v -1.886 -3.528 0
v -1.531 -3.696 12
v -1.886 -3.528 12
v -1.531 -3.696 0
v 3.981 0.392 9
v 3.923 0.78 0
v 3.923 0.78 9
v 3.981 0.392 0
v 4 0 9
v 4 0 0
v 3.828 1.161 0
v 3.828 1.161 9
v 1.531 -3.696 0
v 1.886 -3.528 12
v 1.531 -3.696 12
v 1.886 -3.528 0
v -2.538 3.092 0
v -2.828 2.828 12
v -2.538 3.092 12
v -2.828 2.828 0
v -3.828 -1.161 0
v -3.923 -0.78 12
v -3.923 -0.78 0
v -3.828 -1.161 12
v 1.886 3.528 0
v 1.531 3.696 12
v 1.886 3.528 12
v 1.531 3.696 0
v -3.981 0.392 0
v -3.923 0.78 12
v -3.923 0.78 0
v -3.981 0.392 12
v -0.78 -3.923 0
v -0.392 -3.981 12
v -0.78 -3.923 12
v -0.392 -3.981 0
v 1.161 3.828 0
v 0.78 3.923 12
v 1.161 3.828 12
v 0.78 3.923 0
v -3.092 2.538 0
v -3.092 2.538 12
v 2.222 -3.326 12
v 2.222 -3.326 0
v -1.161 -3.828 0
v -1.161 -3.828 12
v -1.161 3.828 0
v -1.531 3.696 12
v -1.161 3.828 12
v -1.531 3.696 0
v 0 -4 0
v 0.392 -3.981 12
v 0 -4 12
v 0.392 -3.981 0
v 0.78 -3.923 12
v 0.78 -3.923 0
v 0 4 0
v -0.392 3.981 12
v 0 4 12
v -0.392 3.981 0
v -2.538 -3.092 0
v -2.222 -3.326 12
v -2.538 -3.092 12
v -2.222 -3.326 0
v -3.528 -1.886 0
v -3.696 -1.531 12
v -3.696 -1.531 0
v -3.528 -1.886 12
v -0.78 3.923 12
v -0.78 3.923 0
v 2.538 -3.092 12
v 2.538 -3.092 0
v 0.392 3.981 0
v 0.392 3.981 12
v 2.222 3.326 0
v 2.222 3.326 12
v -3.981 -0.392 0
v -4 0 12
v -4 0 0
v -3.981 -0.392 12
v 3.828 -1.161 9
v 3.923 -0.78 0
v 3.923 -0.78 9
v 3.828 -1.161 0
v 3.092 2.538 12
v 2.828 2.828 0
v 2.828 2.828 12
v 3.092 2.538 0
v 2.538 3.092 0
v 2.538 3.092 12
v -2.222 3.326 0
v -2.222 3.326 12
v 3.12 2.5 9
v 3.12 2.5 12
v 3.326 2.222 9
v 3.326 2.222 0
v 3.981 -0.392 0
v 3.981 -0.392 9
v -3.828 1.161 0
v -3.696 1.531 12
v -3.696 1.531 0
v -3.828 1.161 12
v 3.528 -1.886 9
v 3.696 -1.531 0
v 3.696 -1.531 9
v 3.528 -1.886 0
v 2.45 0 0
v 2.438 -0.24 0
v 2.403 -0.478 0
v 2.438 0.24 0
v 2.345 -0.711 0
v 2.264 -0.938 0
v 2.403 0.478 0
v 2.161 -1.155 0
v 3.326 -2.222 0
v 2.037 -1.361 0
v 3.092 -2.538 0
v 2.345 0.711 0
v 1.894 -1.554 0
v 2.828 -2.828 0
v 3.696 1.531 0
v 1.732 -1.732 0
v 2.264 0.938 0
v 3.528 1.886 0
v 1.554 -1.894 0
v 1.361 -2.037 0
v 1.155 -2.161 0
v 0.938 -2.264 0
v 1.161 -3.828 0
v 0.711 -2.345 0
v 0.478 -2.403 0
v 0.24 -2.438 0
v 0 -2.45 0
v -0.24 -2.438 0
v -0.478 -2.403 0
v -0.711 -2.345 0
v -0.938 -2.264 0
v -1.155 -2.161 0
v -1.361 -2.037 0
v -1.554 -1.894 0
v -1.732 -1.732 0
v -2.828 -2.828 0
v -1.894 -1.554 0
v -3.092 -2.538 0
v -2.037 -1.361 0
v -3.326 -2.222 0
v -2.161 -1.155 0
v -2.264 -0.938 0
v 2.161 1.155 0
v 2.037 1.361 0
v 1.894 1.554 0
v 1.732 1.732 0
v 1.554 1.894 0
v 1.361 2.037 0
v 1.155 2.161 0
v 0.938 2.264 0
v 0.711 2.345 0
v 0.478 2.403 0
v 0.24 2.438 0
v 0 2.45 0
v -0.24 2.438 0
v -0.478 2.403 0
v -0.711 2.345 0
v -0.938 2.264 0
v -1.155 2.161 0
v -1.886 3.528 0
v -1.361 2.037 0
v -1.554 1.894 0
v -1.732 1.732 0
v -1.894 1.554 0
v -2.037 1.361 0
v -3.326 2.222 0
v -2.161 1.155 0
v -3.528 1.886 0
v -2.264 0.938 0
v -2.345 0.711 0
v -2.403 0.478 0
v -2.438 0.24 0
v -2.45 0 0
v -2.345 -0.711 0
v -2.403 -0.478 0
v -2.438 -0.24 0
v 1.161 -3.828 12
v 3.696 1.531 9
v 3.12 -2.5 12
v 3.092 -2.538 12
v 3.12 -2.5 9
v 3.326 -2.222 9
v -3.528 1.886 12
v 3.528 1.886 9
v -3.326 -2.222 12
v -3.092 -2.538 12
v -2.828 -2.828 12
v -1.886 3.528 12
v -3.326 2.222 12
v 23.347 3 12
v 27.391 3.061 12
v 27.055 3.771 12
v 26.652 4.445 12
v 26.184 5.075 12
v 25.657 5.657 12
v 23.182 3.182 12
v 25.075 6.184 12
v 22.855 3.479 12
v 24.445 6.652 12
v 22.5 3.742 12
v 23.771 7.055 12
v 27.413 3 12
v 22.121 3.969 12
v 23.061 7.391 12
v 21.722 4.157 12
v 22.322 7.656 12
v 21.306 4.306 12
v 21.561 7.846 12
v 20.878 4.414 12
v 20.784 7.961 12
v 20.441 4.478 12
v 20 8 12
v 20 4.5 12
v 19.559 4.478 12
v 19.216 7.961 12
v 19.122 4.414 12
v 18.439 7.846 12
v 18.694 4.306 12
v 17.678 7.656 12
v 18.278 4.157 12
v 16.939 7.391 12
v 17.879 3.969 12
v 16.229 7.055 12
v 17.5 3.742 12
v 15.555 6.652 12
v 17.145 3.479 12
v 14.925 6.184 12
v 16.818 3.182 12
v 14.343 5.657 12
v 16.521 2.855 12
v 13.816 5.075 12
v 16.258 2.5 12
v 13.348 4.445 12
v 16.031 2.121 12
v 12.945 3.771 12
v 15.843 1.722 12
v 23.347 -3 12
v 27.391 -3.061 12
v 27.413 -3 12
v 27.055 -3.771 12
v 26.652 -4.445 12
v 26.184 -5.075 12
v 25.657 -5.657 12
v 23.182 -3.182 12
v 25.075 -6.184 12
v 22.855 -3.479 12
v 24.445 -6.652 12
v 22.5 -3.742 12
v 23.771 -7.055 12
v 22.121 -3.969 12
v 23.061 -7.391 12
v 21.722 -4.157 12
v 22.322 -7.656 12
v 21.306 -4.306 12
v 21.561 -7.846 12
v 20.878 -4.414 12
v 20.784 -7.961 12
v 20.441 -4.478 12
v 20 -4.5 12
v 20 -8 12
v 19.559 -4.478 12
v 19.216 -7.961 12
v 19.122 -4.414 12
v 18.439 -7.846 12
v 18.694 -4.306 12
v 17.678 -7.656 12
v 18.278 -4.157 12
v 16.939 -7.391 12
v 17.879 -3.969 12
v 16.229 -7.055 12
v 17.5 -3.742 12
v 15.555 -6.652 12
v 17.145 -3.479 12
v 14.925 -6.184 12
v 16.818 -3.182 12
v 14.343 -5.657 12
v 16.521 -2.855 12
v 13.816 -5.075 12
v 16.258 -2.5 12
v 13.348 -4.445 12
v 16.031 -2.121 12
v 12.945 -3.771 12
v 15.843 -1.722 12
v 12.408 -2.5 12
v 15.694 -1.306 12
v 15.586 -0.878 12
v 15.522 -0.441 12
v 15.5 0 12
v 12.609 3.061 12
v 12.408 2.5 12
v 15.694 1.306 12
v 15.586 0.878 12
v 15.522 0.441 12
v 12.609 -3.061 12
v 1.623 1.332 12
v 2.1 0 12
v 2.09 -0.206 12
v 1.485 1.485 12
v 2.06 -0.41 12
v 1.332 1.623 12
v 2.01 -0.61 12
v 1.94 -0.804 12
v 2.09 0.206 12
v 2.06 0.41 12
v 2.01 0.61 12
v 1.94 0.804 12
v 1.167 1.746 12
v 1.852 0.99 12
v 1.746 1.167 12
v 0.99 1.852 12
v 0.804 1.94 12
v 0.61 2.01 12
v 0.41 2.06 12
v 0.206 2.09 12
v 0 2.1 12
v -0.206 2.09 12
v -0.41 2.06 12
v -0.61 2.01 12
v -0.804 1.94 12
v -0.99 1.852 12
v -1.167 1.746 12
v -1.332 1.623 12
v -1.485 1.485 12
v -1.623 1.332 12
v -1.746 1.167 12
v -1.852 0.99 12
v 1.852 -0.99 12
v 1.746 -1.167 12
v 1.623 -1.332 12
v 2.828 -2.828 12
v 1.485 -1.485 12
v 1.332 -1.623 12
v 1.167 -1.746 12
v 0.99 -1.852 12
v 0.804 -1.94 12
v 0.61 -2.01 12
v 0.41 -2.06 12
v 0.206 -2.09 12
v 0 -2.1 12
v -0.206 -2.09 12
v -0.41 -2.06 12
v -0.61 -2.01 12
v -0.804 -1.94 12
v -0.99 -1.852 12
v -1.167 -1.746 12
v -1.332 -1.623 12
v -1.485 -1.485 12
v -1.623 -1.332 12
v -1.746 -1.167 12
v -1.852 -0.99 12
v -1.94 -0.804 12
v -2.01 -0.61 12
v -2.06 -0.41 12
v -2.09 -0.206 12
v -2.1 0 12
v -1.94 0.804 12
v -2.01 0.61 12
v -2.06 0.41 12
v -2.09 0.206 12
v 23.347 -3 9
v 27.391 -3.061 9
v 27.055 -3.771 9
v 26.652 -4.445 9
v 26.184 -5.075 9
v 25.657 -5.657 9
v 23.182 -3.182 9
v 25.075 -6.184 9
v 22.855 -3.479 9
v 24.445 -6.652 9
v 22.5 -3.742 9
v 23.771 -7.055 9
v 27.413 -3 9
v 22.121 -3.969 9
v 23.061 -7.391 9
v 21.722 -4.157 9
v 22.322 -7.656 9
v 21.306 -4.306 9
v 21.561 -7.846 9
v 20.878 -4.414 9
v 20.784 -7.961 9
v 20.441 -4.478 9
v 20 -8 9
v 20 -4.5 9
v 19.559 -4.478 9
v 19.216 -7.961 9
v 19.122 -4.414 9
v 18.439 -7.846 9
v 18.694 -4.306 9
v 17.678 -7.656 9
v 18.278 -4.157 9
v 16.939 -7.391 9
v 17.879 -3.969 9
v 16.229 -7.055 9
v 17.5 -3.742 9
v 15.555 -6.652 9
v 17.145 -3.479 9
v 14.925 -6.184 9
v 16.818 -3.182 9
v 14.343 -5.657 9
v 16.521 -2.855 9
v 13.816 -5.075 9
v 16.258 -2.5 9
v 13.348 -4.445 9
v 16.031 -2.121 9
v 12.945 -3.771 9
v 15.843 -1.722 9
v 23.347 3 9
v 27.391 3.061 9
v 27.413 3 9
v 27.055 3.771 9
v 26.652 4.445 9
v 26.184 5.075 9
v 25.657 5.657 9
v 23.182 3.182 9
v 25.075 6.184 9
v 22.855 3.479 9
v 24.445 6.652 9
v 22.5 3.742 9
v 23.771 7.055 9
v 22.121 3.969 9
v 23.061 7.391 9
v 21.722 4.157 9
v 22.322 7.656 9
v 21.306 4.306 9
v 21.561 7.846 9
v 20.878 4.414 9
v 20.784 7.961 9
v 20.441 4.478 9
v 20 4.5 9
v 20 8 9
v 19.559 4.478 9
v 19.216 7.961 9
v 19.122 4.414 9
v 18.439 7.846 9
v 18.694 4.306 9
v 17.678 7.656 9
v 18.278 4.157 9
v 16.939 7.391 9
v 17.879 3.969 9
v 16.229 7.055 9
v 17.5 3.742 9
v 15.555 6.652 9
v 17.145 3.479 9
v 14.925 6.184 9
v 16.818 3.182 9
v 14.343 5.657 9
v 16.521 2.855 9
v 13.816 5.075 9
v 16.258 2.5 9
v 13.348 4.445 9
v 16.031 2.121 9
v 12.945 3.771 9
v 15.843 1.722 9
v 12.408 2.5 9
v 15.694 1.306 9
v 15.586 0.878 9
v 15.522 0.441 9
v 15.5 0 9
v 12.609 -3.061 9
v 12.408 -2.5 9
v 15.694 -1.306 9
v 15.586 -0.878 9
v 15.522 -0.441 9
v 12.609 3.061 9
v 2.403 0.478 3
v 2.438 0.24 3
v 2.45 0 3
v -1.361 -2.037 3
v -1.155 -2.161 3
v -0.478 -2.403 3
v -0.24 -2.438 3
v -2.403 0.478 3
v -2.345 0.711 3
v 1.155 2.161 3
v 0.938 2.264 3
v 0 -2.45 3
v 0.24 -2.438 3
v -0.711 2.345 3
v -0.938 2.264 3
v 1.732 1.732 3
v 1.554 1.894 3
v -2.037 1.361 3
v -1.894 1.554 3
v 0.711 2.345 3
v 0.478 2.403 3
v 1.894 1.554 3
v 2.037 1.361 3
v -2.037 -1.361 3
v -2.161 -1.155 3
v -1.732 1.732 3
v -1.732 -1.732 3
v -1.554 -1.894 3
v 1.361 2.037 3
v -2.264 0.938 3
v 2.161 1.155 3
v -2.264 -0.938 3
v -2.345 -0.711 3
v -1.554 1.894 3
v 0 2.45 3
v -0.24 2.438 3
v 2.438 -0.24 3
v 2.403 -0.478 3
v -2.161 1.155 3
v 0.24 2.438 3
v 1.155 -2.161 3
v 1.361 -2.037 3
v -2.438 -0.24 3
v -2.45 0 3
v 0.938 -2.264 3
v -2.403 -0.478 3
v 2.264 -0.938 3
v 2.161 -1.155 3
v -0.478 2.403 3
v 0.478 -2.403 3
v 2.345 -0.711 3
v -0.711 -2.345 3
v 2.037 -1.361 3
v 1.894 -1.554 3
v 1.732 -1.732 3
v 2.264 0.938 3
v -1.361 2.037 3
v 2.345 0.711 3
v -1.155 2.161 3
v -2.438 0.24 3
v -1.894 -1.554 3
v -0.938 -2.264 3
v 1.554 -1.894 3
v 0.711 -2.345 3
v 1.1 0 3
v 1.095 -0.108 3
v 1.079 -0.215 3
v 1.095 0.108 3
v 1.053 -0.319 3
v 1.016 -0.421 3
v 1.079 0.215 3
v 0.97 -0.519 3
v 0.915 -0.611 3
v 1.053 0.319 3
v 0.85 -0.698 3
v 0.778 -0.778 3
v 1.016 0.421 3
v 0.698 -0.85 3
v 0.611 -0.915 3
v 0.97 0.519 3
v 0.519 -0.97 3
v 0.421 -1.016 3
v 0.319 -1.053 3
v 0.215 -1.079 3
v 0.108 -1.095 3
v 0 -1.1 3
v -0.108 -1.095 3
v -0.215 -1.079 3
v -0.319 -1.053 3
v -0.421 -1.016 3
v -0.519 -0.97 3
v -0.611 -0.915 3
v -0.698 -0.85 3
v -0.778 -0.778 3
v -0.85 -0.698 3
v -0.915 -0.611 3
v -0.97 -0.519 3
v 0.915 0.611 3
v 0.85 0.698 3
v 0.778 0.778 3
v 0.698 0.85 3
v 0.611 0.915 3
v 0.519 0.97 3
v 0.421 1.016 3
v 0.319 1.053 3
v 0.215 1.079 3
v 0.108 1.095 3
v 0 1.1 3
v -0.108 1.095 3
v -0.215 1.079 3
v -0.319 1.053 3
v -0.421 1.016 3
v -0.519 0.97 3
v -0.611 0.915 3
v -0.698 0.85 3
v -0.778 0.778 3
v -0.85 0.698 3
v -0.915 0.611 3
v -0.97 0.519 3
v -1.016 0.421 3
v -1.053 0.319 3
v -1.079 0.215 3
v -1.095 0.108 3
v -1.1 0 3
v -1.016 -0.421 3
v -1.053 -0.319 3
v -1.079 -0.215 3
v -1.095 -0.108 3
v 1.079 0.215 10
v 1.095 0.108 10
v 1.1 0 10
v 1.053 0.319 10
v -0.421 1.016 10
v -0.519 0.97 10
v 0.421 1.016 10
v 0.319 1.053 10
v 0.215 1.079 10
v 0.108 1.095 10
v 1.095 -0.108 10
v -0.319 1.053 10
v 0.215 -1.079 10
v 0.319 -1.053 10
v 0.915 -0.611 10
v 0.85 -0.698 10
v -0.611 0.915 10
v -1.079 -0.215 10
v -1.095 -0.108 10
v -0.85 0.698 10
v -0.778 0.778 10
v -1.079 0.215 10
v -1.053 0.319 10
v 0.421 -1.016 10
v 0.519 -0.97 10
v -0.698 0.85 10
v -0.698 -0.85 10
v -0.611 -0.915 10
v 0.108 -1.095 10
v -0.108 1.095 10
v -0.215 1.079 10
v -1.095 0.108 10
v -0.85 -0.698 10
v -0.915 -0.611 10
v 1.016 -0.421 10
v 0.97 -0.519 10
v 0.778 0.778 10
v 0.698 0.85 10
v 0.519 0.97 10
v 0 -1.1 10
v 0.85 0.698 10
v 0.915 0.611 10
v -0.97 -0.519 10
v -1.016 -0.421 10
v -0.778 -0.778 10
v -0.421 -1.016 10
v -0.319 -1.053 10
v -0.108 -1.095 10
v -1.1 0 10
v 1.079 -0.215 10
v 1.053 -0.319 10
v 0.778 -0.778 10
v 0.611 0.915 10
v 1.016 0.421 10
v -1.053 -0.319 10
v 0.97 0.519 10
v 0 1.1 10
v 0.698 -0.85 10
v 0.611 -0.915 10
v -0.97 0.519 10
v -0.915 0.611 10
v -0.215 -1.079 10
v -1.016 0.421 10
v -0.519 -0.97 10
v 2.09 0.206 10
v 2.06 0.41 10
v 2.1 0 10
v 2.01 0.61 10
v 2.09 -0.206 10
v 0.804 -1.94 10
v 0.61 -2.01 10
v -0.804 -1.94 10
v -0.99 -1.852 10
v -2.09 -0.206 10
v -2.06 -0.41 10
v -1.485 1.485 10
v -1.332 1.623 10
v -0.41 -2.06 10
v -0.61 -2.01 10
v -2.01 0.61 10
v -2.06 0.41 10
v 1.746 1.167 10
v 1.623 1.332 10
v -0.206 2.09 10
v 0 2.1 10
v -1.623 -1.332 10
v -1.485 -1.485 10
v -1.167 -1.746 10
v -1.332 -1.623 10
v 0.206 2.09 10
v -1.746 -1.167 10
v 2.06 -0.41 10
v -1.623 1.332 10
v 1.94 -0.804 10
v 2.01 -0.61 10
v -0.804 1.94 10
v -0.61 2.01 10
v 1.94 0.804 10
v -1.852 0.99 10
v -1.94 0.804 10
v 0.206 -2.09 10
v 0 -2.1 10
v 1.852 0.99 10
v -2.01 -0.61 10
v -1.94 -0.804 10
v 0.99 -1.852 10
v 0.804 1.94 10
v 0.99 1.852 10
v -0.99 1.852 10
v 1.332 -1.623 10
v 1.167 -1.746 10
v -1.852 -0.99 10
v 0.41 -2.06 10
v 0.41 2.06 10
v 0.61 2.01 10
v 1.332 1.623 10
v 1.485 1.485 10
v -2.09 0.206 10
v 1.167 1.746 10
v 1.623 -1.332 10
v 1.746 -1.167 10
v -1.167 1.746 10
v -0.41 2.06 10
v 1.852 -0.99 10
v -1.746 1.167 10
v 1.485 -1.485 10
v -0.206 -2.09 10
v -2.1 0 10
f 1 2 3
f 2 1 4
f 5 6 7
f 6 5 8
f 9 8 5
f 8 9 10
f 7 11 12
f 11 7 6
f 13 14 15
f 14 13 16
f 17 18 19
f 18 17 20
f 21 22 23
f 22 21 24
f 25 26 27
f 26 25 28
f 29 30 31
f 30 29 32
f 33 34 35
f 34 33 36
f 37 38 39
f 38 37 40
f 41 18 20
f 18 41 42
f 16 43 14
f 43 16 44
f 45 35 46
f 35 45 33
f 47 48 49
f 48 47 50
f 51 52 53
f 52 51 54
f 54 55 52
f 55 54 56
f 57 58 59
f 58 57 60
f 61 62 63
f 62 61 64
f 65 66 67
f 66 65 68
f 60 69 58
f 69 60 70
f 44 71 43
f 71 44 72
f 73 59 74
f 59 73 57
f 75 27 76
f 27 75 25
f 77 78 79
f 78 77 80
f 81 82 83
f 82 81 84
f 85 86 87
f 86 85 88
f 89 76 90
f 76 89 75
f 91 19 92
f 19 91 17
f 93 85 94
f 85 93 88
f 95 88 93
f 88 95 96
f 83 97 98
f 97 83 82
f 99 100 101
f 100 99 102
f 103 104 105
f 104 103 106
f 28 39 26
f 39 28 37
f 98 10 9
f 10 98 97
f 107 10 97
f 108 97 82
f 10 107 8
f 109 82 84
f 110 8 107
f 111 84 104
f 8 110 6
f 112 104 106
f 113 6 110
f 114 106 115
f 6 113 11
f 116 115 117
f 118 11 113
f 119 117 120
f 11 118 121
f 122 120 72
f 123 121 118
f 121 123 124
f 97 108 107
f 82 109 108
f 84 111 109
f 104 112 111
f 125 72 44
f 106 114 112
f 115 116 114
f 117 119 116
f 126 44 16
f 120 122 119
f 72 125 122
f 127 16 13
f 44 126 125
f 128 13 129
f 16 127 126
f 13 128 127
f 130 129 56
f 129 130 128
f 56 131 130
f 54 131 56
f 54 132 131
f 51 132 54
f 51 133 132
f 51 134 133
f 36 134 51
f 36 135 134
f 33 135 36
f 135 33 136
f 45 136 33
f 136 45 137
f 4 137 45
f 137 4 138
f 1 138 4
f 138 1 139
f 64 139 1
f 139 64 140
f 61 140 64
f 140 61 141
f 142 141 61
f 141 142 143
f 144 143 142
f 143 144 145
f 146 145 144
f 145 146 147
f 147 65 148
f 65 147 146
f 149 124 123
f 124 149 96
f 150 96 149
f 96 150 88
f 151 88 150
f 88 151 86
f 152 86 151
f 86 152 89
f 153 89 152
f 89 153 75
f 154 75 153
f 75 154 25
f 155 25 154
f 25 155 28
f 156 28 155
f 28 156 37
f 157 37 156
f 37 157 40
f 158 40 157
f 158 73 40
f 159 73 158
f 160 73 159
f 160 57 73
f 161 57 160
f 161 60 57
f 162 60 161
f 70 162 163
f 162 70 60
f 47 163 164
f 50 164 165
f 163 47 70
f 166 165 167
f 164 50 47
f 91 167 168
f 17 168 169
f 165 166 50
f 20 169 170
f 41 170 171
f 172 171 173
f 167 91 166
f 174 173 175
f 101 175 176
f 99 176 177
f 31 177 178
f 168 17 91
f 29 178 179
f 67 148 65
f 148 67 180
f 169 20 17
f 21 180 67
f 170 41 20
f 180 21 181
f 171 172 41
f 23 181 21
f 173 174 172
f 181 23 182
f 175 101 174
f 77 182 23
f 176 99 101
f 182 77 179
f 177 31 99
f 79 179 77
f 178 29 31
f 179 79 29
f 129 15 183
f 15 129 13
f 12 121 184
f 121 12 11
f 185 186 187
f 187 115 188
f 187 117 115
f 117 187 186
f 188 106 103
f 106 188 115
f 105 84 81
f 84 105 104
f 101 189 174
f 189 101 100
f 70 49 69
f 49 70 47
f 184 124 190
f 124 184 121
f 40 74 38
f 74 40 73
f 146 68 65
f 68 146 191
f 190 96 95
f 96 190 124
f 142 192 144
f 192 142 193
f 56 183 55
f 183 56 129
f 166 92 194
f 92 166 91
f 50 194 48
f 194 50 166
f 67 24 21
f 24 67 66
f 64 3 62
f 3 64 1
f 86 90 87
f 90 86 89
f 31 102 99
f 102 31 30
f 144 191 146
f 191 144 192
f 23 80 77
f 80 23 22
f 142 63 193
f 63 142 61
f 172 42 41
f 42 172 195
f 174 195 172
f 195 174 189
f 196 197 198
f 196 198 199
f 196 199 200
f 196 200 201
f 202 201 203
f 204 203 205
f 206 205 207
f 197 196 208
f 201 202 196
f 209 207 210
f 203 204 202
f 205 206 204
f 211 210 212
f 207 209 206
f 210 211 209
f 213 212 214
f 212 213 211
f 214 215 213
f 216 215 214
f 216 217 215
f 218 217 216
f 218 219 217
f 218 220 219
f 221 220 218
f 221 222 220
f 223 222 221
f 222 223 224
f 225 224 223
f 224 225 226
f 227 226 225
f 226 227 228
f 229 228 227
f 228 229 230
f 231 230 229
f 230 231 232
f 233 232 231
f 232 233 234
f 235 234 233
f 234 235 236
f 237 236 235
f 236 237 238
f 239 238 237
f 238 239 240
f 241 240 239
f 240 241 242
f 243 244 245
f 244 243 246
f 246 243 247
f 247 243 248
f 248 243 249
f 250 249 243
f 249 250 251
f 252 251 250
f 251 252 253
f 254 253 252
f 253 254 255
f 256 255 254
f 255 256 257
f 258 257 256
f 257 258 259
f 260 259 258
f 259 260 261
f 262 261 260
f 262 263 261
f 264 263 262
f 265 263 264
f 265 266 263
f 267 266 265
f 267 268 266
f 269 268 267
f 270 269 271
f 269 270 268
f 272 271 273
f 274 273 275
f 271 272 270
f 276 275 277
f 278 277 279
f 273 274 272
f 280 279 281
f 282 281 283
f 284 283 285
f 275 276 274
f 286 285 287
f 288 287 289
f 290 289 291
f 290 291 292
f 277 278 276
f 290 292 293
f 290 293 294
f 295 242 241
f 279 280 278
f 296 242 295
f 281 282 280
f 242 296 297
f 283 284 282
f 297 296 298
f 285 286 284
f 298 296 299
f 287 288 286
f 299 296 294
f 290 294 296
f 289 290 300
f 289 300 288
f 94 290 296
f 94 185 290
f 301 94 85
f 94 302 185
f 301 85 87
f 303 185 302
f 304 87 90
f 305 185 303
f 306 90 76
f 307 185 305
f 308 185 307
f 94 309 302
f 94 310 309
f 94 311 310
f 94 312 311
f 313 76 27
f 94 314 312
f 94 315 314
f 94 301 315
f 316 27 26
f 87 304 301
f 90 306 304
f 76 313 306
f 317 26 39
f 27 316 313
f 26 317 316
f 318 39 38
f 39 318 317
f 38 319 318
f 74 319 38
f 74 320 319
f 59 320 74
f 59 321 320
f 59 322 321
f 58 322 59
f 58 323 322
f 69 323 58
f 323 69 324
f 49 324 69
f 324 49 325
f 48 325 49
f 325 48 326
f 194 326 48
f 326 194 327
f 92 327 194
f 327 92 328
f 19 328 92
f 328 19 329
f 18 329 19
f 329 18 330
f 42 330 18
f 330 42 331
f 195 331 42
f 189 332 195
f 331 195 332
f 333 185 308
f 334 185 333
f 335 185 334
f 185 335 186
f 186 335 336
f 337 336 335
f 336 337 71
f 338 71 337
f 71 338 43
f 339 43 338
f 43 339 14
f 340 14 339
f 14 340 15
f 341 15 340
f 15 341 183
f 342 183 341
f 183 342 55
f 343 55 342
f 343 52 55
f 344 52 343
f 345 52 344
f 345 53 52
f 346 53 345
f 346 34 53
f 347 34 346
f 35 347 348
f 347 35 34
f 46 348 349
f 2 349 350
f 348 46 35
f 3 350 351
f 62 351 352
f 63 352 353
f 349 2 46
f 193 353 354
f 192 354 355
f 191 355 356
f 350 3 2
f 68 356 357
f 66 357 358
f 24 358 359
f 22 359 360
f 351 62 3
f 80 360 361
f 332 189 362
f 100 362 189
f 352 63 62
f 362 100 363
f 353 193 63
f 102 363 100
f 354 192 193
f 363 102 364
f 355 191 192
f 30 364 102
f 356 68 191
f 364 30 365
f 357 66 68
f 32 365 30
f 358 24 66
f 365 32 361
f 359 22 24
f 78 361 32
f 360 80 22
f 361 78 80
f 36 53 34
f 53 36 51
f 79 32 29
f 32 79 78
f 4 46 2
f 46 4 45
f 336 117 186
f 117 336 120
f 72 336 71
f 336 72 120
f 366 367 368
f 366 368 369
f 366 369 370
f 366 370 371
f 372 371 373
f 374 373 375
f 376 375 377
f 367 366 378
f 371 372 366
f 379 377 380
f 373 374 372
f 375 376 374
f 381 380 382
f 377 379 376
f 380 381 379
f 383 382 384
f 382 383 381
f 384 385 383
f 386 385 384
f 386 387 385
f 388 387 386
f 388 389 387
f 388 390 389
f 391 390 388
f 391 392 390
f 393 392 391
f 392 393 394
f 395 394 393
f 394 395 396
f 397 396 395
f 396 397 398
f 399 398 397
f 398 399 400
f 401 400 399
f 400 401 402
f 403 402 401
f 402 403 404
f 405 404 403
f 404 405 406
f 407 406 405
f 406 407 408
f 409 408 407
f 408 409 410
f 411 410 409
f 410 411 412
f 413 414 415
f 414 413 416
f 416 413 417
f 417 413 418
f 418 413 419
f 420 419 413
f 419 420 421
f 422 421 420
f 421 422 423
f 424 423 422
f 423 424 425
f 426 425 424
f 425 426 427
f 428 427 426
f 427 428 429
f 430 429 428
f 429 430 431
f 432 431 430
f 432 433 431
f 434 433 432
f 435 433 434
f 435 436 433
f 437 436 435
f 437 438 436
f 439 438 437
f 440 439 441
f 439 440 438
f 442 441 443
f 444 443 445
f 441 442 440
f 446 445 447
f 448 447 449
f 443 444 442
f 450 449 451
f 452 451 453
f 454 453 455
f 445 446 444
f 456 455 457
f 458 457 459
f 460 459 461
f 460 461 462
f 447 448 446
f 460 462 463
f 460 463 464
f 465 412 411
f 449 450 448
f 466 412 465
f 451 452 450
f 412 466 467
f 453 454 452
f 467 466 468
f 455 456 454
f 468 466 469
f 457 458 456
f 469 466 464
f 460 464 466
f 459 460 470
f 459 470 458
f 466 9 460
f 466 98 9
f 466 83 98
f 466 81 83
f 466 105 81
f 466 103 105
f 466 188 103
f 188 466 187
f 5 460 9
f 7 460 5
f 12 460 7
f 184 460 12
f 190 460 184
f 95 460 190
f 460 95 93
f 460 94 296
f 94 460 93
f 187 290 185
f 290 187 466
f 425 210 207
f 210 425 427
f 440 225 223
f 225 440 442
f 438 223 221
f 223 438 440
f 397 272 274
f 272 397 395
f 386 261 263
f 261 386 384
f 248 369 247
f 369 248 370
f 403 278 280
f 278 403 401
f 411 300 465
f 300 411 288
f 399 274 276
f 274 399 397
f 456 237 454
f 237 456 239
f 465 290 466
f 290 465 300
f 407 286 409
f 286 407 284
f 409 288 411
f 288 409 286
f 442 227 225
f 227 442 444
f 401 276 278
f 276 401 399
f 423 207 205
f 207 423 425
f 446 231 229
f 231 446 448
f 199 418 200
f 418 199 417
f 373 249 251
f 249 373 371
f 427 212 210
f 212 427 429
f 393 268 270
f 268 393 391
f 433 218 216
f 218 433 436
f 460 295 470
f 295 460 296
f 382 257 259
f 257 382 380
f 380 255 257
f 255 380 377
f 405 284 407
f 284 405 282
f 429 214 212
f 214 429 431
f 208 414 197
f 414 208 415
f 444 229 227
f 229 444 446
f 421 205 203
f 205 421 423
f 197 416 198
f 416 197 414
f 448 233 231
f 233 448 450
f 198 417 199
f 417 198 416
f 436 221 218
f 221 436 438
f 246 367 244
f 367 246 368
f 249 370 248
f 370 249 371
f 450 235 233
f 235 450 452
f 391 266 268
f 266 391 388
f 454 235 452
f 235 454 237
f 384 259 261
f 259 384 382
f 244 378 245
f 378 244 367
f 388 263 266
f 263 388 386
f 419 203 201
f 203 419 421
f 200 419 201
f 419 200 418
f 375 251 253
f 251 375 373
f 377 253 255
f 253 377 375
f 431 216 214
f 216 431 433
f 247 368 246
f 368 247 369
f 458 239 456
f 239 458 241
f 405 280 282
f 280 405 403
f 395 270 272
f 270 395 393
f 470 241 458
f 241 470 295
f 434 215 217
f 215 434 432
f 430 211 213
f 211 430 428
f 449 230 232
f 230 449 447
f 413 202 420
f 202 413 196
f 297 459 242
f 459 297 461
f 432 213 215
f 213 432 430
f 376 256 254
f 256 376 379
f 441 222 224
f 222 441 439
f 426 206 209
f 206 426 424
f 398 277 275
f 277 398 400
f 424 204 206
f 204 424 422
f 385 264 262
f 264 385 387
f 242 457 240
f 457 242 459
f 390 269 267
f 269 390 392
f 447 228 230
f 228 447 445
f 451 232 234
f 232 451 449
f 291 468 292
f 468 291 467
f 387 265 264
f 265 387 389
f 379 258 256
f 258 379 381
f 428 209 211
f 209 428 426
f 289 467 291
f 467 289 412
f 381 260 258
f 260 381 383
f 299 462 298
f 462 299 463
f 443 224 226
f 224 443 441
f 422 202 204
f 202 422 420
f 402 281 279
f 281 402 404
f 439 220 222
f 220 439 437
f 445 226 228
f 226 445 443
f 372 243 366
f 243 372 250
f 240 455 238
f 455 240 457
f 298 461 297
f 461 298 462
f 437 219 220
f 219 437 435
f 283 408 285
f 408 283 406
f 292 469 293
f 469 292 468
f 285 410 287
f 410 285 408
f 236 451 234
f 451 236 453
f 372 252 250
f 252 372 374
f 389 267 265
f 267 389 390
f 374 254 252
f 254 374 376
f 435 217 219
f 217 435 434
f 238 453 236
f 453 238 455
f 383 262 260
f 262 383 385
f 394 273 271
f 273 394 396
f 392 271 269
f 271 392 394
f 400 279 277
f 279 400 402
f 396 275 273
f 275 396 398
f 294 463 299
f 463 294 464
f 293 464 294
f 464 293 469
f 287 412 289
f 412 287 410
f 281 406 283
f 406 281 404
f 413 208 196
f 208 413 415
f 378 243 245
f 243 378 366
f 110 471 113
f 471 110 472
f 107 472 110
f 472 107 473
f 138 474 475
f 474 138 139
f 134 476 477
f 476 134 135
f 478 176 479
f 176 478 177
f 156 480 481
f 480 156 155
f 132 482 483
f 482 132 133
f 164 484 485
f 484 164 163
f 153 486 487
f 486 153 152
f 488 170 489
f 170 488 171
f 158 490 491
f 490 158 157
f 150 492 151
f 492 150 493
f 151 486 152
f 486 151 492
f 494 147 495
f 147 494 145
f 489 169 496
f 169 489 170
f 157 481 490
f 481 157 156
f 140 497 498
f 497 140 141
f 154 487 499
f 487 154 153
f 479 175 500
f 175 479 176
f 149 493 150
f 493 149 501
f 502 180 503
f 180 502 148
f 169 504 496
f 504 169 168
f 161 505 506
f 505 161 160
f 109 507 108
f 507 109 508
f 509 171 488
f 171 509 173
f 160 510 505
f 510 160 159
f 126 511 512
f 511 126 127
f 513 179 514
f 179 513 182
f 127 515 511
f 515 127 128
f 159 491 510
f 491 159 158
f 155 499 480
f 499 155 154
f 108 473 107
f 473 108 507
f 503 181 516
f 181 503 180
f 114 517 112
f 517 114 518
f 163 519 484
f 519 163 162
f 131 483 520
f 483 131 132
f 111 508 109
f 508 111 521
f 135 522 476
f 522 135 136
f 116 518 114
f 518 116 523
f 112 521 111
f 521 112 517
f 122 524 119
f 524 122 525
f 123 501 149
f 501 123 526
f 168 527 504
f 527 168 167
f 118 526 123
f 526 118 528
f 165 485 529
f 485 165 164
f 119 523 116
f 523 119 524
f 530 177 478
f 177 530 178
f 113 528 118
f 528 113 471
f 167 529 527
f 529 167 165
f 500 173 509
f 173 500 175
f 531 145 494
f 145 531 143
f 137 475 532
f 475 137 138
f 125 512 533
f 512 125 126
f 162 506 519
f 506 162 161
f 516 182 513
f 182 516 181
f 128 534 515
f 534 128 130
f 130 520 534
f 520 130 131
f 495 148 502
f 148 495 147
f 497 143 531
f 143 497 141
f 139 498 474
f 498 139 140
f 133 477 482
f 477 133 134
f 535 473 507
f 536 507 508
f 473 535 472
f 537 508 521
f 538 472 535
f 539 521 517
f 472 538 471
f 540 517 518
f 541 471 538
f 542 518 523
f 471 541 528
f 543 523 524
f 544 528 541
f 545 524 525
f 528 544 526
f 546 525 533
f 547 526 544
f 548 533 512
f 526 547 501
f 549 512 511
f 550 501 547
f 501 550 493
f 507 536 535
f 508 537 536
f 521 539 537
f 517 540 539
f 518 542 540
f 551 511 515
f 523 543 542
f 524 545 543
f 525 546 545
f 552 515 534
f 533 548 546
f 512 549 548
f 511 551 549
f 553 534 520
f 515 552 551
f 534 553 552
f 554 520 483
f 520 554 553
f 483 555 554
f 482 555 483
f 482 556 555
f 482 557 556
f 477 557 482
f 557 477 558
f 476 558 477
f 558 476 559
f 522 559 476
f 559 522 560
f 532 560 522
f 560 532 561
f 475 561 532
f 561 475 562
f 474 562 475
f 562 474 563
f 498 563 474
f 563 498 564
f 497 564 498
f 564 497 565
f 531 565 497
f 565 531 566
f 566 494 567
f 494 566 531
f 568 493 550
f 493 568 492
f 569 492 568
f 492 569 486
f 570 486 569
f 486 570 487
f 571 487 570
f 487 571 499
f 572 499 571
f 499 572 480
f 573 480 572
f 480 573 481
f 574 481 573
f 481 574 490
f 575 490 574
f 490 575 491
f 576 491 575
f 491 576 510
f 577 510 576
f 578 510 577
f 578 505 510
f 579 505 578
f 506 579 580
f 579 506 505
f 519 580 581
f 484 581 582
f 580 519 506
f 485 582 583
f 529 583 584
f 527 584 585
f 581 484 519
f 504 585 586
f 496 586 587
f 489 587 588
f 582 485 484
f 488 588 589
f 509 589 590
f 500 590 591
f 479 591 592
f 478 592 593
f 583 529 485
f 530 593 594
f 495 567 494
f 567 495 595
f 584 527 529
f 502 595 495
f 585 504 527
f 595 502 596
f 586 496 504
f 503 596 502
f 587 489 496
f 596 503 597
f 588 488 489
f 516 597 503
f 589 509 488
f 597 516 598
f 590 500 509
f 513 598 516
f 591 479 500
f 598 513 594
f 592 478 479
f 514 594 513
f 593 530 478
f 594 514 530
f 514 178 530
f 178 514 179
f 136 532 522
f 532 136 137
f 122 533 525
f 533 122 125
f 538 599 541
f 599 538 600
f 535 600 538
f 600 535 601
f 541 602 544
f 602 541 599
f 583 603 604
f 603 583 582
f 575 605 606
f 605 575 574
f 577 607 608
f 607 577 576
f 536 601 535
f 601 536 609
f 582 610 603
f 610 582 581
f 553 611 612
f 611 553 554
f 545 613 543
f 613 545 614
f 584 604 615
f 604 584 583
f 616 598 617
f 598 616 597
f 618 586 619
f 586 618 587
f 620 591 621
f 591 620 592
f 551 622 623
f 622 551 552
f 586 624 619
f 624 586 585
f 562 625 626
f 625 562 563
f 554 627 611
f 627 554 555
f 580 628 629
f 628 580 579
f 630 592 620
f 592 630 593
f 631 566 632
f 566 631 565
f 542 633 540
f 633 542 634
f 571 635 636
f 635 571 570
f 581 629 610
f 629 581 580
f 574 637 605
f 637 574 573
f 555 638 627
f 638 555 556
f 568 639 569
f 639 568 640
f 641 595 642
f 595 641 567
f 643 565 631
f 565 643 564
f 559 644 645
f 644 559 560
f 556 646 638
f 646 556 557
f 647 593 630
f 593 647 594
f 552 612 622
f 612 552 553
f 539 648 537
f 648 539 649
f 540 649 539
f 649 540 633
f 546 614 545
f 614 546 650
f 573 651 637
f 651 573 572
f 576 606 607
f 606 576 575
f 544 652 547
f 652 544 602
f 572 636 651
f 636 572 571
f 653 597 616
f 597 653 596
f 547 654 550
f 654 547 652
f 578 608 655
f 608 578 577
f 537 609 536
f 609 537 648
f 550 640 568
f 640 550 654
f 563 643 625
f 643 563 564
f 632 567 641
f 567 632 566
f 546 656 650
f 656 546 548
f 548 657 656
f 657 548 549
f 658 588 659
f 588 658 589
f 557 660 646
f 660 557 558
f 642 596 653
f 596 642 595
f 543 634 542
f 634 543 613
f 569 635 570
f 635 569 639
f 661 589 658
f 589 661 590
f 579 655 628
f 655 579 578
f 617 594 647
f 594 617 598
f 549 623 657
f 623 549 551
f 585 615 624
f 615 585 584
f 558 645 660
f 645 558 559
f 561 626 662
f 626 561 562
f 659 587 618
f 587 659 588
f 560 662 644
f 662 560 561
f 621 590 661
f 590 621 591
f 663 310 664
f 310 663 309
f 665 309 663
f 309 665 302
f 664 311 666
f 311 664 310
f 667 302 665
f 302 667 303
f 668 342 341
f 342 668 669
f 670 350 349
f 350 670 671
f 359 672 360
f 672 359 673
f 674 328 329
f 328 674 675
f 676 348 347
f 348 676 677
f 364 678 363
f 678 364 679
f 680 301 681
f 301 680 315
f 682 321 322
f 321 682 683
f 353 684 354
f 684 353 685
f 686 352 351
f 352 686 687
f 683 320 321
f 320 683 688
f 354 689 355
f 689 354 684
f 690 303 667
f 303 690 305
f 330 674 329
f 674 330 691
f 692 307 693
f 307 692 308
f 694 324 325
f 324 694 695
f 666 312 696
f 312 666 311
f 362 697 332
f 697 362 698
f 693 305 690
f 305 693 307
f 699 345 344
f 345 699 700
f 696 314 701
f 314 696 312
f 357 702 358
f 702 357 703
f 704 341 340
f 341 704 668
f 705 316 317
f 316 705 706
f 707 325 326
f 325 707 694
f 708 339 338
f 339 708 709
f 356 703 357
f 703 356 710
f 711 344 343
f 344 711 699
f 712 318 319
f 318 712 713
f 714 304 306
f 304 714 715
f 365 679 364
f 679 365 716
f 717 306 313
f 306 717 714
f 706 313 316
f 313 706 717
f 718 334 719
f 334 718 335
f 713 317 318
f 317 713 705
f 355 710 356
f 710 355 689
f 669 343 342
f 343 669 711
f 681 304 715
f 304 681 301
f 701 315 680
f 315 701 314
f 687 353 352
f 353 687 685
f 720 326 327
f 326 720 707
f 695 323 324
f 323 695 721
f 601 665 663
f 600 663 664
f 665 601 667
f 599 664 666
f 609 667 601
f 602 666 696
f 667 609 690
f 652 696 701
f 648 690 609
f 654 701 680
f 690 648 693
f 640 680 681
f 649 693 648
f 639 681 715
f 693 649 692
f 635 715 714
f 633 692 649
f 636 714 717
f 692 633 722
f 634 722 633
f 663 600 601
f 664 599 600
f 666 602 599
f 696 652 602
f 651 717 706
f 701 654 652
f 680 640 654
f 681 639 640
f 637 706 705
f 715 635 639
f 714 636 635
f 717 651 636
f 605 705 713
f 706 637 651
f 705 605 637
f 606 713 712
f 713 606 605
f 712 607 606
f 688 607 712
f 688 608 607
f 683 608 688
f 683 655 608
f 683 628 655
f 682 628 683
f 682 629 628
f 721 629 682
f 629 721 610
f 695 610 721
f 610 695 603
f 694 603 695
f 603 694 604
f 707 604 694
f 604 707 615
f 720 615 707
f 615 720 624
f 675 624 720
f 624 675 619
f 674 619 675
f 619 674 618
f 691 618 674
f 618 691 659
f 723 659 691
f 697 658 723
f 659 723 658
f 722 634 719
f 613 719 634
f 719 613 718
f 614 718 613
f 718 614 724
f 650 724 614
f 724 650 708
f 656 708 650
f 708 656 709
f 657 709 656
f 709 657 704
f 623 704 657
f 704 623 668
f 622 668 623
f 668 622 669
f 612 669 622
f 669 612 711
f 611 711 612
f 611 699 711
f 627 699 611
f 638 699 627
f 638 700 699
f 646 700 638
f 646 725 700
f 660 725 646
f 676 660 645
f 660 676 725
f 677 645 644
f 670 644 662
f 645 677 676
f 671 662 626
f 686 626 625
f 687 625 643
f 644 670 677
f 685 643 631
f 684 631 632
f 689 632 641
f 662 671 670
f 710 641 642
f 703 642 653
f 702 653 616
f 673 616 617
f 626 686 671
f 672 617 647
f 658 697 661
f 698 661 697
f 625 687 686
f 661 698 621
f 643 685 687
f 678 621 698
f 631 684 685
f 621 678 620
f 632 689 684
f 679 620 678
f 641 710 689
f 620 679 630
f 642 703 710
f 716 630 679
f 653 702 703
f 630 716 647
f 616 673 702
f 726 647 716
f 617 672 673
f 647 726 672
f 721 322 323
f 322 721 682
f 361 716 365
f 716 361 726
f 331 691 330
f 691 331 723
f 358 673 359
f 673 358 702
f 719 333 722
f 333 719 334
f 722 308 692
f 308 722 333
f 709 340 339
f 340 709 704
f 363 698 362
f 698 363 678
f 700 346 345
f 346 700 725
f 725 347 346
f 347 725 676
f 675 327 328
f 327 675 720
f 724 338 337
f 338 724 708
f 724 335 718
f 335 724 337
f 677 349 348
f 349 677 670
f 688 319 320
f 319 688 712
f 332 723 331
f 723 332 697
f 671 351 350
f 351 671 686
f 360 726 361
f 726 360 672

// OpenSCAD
// SG90-compatible chain hook horn for Project Grace.
// Test the spline fit with a short print before printing the full part.

servo_hub_diameter = 8;
servo_hub_height = 12;
servo_socket_diameter = 4.9;
servo_socket_depth = 3;
servo_centre_screw_diameter = 2.2;
servo_screw_head_diameter = 4.2;
servo_screw_head_depth = 2;

hook_outer_radius = 8;
hook_inner_radius = 4.5;
hook_centre_x = 20;
hook_opening_width = 6;
hook_arm_width = 5;
hook_plate_thickness = 3;

module chain_hook_horn() {
    difference() {
        union() {
            cylinder(d = servo_hub_diameter, h = servo_hub_height, $fn = 64);

            translate([
                0,
                -hook_arm_width / 2,
                servo_hub_height - hook_plate_thickness
            ])
                cube([
                    hook_centre_x - hook_inner_radius + 1,
                    hook_arm_width,
                    hook_plate_thickness
                ]);

            translate([hook_centre_x, 0, servo_hub_height - hook_plate_thickness])
                cylinder(r = hook_outer_radius, h = hook_plate_thickness, $fn = 64);
        }

        translate([hook_centre_x, 0, servo_hub_height - hook_plate_thickness - 0.1])
            cylinder(r = hook_inner_radius, h = hook_plate_thickness + 0.2, $fn = 64);
        translate([
            hook_centre_x,
            -hook_opening_width / 2,
            servo_hub_height - hook_plate_thickness - 0.1
        ])
            cube([
                hook_outer_radius + 1,
                hook_opening_width,
                hook_plate_thickness + 0.2
            ]);

        translate([0, 0, -0.1])
            cylinder(d = servo_socket_diameter, h = servo_socket_depth + 0.1, $fn = 64);
        translate([0, 0, -0.1])
            cylinder(d = servo_centre_screw_diameter, h = servo_hub_height + 0.2, $fn = 64);
        translate([0, 0, servo_hub_height - servo_screw_head_depth])
            cylinder(d = servo_screw_head_diameter, h = servo_screw_head_depth + 0.1, $fn = 64);
    }
}

color("orange")
    chain_hook_horn();
